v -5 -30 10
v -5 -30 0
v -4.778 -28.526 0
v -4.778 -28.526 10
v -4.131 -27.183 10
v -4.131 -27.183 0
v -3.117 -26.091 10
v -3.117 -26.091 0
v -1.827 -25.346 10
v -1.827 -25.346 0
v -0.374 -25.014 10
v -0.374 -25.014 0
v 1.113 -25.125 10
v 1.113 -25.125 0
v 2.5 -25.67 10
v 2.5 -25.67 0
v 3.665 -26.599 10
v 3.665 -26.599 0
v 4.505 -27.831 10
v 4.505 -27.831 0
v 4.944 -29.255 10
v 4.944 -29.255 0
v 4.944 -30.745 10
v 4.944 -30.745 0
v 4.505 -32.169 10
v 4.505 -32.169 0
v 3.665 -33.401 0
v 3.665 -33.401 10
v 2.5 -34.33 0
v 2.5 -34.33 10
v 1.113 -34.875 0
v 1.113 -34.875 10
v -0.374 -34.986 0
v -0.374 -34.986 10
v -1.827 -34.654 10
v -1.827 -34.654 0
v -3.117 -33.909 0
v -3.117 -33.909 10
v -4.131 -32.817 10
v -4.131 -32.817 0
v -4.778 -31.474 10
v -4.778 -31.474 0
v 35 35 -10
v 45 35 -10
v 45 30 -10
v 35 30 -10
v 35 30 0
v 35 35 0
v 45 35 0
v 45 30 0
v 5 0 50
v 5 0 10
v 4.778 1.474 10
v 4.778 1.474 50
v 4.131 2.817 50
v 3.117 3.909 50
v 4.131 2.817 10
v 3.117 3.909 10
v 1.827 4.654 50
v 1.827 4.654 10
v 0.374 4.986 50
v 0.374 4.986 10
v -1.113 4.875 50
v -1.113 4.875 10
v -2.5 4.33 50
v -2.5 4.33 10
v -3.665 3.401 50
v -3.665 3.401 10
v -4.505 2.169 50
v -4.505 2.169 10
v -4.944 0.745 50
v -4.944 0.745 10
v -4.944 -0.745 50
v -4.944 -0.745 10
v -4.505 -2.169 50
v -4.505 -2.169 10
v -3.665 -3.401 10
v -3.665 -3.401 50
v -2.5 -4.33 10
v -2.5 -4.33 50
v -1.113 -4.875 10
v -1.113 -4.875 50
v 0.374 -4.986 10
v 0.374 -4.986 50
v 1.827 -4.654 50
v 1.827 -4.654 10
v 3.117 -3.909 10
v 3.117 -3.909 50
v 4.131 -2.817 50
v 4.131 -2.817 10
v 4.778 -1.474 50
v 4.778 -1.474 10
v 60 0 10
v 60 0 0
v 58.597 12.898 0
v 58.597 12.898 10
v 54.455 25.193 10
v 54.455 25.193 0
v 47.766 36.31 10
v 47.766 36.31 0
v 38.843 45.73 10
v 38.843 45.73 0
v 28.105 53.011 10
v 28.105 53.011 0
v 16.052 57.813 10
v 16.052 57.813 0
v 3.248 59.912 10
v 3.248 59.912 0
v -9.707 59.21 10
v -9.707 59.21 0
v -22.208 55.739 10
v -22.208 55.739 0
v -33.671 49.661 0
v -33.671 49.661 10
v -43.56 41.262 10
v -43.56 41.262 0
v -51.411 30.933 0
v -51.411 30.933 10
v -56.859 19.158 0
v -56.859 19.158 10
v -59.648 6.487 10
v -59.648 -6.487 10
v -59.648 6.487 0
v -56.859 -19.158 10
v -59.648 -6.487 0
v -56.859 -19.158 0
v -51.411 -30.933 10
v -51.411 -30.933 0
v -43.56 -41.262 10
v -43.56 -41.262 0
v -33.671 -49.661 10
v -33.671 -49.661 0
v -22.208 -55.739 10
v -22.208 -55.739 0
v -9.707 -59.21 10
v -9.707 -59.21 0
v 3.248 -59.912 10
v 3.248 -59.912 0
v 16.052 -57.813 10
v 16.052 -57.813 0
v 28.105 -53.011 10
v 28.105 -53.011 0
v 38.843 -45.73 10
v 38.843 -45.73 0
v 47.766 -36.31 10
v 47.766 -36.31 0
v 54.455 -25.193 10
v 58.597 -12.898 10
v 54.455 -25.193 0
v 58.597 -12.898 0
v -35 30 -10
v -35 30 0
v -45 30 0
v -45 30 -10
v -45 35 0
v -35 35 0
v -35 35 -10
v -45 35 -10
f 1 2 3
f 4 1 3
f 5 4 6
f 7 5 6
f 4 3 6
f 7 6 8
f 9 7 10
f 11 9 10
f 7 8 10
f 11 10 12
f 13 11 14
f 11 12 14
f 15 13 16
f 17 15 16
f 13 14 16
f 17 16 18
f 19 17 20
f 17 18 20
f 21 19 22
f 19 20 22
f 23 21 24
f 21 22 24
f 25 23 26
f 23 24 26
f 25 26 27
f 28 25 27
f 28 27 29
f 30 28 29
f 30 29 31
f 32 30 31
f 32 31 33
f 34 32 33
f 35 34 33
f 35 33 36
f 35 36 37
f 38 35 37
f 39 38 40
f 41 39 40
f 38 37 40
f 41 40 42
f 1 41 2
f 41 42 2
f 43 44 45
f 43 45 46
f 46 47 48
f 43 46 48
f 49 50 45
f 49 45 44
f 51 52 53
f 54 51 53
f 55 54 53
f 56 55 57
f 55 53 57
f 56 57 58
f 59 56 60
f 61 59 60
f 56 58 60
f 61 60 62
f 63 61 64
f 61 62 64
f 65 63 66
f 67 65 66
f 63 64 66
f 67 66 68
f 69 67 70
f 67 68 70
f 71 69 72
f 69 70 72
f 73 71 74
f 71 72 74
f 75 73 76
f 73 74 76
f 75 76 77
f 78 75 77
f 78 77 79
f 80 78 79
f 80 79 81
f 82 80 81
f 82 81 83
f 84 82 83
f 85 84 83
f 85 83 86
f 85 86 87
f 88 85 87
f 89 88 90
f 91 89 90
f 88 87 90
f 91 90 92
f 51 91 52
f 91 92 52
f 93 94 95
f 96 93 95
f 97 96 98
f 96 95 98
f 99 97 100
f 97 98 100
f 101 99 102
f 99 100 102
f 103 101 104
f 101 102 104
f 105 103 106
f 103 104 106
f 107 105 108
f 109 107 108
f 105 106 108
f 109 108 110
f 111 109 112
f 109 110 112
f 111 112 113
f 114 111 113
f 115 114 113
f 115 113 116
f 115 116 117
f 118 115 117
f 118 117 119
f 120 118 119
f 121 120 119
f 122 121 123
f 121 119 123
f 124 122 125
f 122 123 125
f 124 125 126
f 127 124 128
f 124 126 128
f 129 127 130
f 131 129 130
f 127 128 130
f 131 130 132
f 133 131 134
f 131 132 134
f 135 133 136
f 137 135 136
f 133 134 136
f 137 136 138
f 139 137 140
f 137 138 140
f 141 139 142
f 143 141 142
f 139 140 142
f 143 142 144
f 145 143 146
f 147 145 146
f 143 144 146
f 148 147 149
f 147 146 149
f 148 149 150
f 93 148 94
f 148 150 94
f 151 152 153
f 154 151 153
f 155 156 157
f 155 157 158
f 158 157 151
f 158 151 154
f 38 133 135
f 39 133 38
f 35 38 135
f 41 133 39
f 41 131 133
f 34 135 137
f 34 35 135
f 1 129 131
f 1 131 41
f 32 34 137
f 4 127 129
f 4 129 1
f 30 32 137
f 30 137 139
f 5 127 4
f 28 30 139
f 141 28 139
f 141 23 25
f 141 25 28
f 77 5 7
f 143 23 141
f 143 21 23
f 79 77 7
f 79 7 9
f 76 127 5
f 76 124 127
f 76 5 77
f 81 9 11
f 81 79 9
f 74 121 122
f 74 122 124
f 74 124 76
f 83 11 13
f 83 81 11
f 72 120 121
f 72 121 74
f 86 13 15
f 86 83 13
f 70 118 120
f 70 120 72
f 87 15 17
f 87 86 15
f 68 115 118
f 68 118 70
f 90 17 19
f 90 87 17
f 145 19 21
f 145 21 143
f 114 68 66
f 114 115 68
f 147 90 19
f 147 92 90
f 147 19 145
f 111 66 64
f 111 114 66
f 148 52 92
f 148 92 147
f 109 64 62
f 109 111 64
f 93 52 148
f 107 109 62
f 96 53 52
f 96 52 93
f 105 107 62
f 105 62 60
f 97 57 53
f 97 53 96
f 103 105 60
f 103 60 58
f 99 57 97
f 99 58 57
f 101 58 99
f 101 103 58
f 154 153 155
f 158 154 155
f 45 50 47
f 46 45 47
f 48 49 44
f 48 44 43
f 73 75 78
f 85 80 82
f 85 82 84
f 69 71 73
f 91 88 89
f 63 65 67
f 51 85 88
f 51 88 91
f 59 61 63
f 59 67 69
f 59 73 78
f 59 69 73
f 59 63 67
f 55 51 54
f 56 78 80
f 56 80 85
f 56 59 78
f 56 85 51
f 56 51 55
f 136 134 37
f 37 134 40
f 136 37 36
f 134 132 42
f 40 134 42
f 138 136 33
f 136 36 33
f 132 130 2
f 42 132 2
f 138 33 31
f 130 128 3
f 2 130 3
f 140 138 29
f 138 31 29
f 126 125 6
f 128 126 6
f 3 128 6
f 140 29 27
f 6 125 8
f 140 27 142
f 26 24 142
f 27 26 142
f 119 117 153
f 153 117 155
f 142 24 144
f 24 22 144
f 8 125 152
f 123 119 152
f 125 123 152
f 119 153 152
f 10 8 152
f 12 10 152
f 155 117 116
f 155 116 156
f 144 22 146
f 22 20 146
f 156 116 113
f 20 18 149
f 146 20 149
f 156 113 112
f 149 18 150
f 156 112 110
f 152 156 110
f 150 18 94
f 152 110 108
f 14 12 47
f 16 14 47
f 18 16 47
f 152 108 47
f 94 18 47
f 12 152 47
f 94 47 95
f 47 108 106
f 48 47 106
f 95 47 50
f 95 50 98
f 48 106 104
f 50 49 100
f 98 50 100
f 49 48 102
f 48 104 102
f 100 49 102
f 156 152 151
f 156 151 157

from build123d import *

# Parameters (mm, degrees)
SKETCH1_R           = 60
BOSS_EXTRUDE1_DEPTH = 10
SKETCH2_R           = 5
BOSS_EXTRUDE2_DEPTH = 40
SKETCH5_R           = 5
CUT_EXTRUDE1_DEPTH  = 10
SKETCH6_W           = 10
SKETCH6_H           = 5
BOSS_EXTRUDE4_DEPTH = 10


with BuildPart() as part:
    # Sketch1 → Boss-Extrude1 (new body)
    with BuildSketch(Plane.XY):
        Circle(SKETCH1_R)
    extrude(amount=BOSS_EXTRUDE1_DEPTH)

    # Sketch2 → Boss-Extrude2 (add)
    with BuildSketch(Plane.XY.offset(10)):
        Circle(SKETCH2_R)
    extrude(amount=BOSS_EXTRUDE2_DEPTH)

    # Sketch5 → Cut-Extrude1 (cut)
    with BuildSketch(Plane(origin=(0, 0, 0), x_dir=(-1, 0, 0), z_dir=(0, 0, -1))):
        with Locations((0, -30)):
            Circle(SKETCH5_R)
    extrude(amount=-CUT_EXTRUDE1_DEPTH, mode=Mode.SUBTRACT)

    # Sketch6 → Boss-Extrude4 (add)
    with BuildSketch(Plane(origin=(0, 0, 0), x_dir=(-1, 0, 0), z_dir=(0, 0, -1))):
        with Locations((40, 32.5)):
            Rectangle(SKETCH6_W, SKETCH6_H)
        with Locations((-40, 32.5)):
            Rectangle(SKETCH6_W, SKETCH6_H)
    extrude(amount=BOSS_EXTRUDE4_DEPTH)


solid = part.part
